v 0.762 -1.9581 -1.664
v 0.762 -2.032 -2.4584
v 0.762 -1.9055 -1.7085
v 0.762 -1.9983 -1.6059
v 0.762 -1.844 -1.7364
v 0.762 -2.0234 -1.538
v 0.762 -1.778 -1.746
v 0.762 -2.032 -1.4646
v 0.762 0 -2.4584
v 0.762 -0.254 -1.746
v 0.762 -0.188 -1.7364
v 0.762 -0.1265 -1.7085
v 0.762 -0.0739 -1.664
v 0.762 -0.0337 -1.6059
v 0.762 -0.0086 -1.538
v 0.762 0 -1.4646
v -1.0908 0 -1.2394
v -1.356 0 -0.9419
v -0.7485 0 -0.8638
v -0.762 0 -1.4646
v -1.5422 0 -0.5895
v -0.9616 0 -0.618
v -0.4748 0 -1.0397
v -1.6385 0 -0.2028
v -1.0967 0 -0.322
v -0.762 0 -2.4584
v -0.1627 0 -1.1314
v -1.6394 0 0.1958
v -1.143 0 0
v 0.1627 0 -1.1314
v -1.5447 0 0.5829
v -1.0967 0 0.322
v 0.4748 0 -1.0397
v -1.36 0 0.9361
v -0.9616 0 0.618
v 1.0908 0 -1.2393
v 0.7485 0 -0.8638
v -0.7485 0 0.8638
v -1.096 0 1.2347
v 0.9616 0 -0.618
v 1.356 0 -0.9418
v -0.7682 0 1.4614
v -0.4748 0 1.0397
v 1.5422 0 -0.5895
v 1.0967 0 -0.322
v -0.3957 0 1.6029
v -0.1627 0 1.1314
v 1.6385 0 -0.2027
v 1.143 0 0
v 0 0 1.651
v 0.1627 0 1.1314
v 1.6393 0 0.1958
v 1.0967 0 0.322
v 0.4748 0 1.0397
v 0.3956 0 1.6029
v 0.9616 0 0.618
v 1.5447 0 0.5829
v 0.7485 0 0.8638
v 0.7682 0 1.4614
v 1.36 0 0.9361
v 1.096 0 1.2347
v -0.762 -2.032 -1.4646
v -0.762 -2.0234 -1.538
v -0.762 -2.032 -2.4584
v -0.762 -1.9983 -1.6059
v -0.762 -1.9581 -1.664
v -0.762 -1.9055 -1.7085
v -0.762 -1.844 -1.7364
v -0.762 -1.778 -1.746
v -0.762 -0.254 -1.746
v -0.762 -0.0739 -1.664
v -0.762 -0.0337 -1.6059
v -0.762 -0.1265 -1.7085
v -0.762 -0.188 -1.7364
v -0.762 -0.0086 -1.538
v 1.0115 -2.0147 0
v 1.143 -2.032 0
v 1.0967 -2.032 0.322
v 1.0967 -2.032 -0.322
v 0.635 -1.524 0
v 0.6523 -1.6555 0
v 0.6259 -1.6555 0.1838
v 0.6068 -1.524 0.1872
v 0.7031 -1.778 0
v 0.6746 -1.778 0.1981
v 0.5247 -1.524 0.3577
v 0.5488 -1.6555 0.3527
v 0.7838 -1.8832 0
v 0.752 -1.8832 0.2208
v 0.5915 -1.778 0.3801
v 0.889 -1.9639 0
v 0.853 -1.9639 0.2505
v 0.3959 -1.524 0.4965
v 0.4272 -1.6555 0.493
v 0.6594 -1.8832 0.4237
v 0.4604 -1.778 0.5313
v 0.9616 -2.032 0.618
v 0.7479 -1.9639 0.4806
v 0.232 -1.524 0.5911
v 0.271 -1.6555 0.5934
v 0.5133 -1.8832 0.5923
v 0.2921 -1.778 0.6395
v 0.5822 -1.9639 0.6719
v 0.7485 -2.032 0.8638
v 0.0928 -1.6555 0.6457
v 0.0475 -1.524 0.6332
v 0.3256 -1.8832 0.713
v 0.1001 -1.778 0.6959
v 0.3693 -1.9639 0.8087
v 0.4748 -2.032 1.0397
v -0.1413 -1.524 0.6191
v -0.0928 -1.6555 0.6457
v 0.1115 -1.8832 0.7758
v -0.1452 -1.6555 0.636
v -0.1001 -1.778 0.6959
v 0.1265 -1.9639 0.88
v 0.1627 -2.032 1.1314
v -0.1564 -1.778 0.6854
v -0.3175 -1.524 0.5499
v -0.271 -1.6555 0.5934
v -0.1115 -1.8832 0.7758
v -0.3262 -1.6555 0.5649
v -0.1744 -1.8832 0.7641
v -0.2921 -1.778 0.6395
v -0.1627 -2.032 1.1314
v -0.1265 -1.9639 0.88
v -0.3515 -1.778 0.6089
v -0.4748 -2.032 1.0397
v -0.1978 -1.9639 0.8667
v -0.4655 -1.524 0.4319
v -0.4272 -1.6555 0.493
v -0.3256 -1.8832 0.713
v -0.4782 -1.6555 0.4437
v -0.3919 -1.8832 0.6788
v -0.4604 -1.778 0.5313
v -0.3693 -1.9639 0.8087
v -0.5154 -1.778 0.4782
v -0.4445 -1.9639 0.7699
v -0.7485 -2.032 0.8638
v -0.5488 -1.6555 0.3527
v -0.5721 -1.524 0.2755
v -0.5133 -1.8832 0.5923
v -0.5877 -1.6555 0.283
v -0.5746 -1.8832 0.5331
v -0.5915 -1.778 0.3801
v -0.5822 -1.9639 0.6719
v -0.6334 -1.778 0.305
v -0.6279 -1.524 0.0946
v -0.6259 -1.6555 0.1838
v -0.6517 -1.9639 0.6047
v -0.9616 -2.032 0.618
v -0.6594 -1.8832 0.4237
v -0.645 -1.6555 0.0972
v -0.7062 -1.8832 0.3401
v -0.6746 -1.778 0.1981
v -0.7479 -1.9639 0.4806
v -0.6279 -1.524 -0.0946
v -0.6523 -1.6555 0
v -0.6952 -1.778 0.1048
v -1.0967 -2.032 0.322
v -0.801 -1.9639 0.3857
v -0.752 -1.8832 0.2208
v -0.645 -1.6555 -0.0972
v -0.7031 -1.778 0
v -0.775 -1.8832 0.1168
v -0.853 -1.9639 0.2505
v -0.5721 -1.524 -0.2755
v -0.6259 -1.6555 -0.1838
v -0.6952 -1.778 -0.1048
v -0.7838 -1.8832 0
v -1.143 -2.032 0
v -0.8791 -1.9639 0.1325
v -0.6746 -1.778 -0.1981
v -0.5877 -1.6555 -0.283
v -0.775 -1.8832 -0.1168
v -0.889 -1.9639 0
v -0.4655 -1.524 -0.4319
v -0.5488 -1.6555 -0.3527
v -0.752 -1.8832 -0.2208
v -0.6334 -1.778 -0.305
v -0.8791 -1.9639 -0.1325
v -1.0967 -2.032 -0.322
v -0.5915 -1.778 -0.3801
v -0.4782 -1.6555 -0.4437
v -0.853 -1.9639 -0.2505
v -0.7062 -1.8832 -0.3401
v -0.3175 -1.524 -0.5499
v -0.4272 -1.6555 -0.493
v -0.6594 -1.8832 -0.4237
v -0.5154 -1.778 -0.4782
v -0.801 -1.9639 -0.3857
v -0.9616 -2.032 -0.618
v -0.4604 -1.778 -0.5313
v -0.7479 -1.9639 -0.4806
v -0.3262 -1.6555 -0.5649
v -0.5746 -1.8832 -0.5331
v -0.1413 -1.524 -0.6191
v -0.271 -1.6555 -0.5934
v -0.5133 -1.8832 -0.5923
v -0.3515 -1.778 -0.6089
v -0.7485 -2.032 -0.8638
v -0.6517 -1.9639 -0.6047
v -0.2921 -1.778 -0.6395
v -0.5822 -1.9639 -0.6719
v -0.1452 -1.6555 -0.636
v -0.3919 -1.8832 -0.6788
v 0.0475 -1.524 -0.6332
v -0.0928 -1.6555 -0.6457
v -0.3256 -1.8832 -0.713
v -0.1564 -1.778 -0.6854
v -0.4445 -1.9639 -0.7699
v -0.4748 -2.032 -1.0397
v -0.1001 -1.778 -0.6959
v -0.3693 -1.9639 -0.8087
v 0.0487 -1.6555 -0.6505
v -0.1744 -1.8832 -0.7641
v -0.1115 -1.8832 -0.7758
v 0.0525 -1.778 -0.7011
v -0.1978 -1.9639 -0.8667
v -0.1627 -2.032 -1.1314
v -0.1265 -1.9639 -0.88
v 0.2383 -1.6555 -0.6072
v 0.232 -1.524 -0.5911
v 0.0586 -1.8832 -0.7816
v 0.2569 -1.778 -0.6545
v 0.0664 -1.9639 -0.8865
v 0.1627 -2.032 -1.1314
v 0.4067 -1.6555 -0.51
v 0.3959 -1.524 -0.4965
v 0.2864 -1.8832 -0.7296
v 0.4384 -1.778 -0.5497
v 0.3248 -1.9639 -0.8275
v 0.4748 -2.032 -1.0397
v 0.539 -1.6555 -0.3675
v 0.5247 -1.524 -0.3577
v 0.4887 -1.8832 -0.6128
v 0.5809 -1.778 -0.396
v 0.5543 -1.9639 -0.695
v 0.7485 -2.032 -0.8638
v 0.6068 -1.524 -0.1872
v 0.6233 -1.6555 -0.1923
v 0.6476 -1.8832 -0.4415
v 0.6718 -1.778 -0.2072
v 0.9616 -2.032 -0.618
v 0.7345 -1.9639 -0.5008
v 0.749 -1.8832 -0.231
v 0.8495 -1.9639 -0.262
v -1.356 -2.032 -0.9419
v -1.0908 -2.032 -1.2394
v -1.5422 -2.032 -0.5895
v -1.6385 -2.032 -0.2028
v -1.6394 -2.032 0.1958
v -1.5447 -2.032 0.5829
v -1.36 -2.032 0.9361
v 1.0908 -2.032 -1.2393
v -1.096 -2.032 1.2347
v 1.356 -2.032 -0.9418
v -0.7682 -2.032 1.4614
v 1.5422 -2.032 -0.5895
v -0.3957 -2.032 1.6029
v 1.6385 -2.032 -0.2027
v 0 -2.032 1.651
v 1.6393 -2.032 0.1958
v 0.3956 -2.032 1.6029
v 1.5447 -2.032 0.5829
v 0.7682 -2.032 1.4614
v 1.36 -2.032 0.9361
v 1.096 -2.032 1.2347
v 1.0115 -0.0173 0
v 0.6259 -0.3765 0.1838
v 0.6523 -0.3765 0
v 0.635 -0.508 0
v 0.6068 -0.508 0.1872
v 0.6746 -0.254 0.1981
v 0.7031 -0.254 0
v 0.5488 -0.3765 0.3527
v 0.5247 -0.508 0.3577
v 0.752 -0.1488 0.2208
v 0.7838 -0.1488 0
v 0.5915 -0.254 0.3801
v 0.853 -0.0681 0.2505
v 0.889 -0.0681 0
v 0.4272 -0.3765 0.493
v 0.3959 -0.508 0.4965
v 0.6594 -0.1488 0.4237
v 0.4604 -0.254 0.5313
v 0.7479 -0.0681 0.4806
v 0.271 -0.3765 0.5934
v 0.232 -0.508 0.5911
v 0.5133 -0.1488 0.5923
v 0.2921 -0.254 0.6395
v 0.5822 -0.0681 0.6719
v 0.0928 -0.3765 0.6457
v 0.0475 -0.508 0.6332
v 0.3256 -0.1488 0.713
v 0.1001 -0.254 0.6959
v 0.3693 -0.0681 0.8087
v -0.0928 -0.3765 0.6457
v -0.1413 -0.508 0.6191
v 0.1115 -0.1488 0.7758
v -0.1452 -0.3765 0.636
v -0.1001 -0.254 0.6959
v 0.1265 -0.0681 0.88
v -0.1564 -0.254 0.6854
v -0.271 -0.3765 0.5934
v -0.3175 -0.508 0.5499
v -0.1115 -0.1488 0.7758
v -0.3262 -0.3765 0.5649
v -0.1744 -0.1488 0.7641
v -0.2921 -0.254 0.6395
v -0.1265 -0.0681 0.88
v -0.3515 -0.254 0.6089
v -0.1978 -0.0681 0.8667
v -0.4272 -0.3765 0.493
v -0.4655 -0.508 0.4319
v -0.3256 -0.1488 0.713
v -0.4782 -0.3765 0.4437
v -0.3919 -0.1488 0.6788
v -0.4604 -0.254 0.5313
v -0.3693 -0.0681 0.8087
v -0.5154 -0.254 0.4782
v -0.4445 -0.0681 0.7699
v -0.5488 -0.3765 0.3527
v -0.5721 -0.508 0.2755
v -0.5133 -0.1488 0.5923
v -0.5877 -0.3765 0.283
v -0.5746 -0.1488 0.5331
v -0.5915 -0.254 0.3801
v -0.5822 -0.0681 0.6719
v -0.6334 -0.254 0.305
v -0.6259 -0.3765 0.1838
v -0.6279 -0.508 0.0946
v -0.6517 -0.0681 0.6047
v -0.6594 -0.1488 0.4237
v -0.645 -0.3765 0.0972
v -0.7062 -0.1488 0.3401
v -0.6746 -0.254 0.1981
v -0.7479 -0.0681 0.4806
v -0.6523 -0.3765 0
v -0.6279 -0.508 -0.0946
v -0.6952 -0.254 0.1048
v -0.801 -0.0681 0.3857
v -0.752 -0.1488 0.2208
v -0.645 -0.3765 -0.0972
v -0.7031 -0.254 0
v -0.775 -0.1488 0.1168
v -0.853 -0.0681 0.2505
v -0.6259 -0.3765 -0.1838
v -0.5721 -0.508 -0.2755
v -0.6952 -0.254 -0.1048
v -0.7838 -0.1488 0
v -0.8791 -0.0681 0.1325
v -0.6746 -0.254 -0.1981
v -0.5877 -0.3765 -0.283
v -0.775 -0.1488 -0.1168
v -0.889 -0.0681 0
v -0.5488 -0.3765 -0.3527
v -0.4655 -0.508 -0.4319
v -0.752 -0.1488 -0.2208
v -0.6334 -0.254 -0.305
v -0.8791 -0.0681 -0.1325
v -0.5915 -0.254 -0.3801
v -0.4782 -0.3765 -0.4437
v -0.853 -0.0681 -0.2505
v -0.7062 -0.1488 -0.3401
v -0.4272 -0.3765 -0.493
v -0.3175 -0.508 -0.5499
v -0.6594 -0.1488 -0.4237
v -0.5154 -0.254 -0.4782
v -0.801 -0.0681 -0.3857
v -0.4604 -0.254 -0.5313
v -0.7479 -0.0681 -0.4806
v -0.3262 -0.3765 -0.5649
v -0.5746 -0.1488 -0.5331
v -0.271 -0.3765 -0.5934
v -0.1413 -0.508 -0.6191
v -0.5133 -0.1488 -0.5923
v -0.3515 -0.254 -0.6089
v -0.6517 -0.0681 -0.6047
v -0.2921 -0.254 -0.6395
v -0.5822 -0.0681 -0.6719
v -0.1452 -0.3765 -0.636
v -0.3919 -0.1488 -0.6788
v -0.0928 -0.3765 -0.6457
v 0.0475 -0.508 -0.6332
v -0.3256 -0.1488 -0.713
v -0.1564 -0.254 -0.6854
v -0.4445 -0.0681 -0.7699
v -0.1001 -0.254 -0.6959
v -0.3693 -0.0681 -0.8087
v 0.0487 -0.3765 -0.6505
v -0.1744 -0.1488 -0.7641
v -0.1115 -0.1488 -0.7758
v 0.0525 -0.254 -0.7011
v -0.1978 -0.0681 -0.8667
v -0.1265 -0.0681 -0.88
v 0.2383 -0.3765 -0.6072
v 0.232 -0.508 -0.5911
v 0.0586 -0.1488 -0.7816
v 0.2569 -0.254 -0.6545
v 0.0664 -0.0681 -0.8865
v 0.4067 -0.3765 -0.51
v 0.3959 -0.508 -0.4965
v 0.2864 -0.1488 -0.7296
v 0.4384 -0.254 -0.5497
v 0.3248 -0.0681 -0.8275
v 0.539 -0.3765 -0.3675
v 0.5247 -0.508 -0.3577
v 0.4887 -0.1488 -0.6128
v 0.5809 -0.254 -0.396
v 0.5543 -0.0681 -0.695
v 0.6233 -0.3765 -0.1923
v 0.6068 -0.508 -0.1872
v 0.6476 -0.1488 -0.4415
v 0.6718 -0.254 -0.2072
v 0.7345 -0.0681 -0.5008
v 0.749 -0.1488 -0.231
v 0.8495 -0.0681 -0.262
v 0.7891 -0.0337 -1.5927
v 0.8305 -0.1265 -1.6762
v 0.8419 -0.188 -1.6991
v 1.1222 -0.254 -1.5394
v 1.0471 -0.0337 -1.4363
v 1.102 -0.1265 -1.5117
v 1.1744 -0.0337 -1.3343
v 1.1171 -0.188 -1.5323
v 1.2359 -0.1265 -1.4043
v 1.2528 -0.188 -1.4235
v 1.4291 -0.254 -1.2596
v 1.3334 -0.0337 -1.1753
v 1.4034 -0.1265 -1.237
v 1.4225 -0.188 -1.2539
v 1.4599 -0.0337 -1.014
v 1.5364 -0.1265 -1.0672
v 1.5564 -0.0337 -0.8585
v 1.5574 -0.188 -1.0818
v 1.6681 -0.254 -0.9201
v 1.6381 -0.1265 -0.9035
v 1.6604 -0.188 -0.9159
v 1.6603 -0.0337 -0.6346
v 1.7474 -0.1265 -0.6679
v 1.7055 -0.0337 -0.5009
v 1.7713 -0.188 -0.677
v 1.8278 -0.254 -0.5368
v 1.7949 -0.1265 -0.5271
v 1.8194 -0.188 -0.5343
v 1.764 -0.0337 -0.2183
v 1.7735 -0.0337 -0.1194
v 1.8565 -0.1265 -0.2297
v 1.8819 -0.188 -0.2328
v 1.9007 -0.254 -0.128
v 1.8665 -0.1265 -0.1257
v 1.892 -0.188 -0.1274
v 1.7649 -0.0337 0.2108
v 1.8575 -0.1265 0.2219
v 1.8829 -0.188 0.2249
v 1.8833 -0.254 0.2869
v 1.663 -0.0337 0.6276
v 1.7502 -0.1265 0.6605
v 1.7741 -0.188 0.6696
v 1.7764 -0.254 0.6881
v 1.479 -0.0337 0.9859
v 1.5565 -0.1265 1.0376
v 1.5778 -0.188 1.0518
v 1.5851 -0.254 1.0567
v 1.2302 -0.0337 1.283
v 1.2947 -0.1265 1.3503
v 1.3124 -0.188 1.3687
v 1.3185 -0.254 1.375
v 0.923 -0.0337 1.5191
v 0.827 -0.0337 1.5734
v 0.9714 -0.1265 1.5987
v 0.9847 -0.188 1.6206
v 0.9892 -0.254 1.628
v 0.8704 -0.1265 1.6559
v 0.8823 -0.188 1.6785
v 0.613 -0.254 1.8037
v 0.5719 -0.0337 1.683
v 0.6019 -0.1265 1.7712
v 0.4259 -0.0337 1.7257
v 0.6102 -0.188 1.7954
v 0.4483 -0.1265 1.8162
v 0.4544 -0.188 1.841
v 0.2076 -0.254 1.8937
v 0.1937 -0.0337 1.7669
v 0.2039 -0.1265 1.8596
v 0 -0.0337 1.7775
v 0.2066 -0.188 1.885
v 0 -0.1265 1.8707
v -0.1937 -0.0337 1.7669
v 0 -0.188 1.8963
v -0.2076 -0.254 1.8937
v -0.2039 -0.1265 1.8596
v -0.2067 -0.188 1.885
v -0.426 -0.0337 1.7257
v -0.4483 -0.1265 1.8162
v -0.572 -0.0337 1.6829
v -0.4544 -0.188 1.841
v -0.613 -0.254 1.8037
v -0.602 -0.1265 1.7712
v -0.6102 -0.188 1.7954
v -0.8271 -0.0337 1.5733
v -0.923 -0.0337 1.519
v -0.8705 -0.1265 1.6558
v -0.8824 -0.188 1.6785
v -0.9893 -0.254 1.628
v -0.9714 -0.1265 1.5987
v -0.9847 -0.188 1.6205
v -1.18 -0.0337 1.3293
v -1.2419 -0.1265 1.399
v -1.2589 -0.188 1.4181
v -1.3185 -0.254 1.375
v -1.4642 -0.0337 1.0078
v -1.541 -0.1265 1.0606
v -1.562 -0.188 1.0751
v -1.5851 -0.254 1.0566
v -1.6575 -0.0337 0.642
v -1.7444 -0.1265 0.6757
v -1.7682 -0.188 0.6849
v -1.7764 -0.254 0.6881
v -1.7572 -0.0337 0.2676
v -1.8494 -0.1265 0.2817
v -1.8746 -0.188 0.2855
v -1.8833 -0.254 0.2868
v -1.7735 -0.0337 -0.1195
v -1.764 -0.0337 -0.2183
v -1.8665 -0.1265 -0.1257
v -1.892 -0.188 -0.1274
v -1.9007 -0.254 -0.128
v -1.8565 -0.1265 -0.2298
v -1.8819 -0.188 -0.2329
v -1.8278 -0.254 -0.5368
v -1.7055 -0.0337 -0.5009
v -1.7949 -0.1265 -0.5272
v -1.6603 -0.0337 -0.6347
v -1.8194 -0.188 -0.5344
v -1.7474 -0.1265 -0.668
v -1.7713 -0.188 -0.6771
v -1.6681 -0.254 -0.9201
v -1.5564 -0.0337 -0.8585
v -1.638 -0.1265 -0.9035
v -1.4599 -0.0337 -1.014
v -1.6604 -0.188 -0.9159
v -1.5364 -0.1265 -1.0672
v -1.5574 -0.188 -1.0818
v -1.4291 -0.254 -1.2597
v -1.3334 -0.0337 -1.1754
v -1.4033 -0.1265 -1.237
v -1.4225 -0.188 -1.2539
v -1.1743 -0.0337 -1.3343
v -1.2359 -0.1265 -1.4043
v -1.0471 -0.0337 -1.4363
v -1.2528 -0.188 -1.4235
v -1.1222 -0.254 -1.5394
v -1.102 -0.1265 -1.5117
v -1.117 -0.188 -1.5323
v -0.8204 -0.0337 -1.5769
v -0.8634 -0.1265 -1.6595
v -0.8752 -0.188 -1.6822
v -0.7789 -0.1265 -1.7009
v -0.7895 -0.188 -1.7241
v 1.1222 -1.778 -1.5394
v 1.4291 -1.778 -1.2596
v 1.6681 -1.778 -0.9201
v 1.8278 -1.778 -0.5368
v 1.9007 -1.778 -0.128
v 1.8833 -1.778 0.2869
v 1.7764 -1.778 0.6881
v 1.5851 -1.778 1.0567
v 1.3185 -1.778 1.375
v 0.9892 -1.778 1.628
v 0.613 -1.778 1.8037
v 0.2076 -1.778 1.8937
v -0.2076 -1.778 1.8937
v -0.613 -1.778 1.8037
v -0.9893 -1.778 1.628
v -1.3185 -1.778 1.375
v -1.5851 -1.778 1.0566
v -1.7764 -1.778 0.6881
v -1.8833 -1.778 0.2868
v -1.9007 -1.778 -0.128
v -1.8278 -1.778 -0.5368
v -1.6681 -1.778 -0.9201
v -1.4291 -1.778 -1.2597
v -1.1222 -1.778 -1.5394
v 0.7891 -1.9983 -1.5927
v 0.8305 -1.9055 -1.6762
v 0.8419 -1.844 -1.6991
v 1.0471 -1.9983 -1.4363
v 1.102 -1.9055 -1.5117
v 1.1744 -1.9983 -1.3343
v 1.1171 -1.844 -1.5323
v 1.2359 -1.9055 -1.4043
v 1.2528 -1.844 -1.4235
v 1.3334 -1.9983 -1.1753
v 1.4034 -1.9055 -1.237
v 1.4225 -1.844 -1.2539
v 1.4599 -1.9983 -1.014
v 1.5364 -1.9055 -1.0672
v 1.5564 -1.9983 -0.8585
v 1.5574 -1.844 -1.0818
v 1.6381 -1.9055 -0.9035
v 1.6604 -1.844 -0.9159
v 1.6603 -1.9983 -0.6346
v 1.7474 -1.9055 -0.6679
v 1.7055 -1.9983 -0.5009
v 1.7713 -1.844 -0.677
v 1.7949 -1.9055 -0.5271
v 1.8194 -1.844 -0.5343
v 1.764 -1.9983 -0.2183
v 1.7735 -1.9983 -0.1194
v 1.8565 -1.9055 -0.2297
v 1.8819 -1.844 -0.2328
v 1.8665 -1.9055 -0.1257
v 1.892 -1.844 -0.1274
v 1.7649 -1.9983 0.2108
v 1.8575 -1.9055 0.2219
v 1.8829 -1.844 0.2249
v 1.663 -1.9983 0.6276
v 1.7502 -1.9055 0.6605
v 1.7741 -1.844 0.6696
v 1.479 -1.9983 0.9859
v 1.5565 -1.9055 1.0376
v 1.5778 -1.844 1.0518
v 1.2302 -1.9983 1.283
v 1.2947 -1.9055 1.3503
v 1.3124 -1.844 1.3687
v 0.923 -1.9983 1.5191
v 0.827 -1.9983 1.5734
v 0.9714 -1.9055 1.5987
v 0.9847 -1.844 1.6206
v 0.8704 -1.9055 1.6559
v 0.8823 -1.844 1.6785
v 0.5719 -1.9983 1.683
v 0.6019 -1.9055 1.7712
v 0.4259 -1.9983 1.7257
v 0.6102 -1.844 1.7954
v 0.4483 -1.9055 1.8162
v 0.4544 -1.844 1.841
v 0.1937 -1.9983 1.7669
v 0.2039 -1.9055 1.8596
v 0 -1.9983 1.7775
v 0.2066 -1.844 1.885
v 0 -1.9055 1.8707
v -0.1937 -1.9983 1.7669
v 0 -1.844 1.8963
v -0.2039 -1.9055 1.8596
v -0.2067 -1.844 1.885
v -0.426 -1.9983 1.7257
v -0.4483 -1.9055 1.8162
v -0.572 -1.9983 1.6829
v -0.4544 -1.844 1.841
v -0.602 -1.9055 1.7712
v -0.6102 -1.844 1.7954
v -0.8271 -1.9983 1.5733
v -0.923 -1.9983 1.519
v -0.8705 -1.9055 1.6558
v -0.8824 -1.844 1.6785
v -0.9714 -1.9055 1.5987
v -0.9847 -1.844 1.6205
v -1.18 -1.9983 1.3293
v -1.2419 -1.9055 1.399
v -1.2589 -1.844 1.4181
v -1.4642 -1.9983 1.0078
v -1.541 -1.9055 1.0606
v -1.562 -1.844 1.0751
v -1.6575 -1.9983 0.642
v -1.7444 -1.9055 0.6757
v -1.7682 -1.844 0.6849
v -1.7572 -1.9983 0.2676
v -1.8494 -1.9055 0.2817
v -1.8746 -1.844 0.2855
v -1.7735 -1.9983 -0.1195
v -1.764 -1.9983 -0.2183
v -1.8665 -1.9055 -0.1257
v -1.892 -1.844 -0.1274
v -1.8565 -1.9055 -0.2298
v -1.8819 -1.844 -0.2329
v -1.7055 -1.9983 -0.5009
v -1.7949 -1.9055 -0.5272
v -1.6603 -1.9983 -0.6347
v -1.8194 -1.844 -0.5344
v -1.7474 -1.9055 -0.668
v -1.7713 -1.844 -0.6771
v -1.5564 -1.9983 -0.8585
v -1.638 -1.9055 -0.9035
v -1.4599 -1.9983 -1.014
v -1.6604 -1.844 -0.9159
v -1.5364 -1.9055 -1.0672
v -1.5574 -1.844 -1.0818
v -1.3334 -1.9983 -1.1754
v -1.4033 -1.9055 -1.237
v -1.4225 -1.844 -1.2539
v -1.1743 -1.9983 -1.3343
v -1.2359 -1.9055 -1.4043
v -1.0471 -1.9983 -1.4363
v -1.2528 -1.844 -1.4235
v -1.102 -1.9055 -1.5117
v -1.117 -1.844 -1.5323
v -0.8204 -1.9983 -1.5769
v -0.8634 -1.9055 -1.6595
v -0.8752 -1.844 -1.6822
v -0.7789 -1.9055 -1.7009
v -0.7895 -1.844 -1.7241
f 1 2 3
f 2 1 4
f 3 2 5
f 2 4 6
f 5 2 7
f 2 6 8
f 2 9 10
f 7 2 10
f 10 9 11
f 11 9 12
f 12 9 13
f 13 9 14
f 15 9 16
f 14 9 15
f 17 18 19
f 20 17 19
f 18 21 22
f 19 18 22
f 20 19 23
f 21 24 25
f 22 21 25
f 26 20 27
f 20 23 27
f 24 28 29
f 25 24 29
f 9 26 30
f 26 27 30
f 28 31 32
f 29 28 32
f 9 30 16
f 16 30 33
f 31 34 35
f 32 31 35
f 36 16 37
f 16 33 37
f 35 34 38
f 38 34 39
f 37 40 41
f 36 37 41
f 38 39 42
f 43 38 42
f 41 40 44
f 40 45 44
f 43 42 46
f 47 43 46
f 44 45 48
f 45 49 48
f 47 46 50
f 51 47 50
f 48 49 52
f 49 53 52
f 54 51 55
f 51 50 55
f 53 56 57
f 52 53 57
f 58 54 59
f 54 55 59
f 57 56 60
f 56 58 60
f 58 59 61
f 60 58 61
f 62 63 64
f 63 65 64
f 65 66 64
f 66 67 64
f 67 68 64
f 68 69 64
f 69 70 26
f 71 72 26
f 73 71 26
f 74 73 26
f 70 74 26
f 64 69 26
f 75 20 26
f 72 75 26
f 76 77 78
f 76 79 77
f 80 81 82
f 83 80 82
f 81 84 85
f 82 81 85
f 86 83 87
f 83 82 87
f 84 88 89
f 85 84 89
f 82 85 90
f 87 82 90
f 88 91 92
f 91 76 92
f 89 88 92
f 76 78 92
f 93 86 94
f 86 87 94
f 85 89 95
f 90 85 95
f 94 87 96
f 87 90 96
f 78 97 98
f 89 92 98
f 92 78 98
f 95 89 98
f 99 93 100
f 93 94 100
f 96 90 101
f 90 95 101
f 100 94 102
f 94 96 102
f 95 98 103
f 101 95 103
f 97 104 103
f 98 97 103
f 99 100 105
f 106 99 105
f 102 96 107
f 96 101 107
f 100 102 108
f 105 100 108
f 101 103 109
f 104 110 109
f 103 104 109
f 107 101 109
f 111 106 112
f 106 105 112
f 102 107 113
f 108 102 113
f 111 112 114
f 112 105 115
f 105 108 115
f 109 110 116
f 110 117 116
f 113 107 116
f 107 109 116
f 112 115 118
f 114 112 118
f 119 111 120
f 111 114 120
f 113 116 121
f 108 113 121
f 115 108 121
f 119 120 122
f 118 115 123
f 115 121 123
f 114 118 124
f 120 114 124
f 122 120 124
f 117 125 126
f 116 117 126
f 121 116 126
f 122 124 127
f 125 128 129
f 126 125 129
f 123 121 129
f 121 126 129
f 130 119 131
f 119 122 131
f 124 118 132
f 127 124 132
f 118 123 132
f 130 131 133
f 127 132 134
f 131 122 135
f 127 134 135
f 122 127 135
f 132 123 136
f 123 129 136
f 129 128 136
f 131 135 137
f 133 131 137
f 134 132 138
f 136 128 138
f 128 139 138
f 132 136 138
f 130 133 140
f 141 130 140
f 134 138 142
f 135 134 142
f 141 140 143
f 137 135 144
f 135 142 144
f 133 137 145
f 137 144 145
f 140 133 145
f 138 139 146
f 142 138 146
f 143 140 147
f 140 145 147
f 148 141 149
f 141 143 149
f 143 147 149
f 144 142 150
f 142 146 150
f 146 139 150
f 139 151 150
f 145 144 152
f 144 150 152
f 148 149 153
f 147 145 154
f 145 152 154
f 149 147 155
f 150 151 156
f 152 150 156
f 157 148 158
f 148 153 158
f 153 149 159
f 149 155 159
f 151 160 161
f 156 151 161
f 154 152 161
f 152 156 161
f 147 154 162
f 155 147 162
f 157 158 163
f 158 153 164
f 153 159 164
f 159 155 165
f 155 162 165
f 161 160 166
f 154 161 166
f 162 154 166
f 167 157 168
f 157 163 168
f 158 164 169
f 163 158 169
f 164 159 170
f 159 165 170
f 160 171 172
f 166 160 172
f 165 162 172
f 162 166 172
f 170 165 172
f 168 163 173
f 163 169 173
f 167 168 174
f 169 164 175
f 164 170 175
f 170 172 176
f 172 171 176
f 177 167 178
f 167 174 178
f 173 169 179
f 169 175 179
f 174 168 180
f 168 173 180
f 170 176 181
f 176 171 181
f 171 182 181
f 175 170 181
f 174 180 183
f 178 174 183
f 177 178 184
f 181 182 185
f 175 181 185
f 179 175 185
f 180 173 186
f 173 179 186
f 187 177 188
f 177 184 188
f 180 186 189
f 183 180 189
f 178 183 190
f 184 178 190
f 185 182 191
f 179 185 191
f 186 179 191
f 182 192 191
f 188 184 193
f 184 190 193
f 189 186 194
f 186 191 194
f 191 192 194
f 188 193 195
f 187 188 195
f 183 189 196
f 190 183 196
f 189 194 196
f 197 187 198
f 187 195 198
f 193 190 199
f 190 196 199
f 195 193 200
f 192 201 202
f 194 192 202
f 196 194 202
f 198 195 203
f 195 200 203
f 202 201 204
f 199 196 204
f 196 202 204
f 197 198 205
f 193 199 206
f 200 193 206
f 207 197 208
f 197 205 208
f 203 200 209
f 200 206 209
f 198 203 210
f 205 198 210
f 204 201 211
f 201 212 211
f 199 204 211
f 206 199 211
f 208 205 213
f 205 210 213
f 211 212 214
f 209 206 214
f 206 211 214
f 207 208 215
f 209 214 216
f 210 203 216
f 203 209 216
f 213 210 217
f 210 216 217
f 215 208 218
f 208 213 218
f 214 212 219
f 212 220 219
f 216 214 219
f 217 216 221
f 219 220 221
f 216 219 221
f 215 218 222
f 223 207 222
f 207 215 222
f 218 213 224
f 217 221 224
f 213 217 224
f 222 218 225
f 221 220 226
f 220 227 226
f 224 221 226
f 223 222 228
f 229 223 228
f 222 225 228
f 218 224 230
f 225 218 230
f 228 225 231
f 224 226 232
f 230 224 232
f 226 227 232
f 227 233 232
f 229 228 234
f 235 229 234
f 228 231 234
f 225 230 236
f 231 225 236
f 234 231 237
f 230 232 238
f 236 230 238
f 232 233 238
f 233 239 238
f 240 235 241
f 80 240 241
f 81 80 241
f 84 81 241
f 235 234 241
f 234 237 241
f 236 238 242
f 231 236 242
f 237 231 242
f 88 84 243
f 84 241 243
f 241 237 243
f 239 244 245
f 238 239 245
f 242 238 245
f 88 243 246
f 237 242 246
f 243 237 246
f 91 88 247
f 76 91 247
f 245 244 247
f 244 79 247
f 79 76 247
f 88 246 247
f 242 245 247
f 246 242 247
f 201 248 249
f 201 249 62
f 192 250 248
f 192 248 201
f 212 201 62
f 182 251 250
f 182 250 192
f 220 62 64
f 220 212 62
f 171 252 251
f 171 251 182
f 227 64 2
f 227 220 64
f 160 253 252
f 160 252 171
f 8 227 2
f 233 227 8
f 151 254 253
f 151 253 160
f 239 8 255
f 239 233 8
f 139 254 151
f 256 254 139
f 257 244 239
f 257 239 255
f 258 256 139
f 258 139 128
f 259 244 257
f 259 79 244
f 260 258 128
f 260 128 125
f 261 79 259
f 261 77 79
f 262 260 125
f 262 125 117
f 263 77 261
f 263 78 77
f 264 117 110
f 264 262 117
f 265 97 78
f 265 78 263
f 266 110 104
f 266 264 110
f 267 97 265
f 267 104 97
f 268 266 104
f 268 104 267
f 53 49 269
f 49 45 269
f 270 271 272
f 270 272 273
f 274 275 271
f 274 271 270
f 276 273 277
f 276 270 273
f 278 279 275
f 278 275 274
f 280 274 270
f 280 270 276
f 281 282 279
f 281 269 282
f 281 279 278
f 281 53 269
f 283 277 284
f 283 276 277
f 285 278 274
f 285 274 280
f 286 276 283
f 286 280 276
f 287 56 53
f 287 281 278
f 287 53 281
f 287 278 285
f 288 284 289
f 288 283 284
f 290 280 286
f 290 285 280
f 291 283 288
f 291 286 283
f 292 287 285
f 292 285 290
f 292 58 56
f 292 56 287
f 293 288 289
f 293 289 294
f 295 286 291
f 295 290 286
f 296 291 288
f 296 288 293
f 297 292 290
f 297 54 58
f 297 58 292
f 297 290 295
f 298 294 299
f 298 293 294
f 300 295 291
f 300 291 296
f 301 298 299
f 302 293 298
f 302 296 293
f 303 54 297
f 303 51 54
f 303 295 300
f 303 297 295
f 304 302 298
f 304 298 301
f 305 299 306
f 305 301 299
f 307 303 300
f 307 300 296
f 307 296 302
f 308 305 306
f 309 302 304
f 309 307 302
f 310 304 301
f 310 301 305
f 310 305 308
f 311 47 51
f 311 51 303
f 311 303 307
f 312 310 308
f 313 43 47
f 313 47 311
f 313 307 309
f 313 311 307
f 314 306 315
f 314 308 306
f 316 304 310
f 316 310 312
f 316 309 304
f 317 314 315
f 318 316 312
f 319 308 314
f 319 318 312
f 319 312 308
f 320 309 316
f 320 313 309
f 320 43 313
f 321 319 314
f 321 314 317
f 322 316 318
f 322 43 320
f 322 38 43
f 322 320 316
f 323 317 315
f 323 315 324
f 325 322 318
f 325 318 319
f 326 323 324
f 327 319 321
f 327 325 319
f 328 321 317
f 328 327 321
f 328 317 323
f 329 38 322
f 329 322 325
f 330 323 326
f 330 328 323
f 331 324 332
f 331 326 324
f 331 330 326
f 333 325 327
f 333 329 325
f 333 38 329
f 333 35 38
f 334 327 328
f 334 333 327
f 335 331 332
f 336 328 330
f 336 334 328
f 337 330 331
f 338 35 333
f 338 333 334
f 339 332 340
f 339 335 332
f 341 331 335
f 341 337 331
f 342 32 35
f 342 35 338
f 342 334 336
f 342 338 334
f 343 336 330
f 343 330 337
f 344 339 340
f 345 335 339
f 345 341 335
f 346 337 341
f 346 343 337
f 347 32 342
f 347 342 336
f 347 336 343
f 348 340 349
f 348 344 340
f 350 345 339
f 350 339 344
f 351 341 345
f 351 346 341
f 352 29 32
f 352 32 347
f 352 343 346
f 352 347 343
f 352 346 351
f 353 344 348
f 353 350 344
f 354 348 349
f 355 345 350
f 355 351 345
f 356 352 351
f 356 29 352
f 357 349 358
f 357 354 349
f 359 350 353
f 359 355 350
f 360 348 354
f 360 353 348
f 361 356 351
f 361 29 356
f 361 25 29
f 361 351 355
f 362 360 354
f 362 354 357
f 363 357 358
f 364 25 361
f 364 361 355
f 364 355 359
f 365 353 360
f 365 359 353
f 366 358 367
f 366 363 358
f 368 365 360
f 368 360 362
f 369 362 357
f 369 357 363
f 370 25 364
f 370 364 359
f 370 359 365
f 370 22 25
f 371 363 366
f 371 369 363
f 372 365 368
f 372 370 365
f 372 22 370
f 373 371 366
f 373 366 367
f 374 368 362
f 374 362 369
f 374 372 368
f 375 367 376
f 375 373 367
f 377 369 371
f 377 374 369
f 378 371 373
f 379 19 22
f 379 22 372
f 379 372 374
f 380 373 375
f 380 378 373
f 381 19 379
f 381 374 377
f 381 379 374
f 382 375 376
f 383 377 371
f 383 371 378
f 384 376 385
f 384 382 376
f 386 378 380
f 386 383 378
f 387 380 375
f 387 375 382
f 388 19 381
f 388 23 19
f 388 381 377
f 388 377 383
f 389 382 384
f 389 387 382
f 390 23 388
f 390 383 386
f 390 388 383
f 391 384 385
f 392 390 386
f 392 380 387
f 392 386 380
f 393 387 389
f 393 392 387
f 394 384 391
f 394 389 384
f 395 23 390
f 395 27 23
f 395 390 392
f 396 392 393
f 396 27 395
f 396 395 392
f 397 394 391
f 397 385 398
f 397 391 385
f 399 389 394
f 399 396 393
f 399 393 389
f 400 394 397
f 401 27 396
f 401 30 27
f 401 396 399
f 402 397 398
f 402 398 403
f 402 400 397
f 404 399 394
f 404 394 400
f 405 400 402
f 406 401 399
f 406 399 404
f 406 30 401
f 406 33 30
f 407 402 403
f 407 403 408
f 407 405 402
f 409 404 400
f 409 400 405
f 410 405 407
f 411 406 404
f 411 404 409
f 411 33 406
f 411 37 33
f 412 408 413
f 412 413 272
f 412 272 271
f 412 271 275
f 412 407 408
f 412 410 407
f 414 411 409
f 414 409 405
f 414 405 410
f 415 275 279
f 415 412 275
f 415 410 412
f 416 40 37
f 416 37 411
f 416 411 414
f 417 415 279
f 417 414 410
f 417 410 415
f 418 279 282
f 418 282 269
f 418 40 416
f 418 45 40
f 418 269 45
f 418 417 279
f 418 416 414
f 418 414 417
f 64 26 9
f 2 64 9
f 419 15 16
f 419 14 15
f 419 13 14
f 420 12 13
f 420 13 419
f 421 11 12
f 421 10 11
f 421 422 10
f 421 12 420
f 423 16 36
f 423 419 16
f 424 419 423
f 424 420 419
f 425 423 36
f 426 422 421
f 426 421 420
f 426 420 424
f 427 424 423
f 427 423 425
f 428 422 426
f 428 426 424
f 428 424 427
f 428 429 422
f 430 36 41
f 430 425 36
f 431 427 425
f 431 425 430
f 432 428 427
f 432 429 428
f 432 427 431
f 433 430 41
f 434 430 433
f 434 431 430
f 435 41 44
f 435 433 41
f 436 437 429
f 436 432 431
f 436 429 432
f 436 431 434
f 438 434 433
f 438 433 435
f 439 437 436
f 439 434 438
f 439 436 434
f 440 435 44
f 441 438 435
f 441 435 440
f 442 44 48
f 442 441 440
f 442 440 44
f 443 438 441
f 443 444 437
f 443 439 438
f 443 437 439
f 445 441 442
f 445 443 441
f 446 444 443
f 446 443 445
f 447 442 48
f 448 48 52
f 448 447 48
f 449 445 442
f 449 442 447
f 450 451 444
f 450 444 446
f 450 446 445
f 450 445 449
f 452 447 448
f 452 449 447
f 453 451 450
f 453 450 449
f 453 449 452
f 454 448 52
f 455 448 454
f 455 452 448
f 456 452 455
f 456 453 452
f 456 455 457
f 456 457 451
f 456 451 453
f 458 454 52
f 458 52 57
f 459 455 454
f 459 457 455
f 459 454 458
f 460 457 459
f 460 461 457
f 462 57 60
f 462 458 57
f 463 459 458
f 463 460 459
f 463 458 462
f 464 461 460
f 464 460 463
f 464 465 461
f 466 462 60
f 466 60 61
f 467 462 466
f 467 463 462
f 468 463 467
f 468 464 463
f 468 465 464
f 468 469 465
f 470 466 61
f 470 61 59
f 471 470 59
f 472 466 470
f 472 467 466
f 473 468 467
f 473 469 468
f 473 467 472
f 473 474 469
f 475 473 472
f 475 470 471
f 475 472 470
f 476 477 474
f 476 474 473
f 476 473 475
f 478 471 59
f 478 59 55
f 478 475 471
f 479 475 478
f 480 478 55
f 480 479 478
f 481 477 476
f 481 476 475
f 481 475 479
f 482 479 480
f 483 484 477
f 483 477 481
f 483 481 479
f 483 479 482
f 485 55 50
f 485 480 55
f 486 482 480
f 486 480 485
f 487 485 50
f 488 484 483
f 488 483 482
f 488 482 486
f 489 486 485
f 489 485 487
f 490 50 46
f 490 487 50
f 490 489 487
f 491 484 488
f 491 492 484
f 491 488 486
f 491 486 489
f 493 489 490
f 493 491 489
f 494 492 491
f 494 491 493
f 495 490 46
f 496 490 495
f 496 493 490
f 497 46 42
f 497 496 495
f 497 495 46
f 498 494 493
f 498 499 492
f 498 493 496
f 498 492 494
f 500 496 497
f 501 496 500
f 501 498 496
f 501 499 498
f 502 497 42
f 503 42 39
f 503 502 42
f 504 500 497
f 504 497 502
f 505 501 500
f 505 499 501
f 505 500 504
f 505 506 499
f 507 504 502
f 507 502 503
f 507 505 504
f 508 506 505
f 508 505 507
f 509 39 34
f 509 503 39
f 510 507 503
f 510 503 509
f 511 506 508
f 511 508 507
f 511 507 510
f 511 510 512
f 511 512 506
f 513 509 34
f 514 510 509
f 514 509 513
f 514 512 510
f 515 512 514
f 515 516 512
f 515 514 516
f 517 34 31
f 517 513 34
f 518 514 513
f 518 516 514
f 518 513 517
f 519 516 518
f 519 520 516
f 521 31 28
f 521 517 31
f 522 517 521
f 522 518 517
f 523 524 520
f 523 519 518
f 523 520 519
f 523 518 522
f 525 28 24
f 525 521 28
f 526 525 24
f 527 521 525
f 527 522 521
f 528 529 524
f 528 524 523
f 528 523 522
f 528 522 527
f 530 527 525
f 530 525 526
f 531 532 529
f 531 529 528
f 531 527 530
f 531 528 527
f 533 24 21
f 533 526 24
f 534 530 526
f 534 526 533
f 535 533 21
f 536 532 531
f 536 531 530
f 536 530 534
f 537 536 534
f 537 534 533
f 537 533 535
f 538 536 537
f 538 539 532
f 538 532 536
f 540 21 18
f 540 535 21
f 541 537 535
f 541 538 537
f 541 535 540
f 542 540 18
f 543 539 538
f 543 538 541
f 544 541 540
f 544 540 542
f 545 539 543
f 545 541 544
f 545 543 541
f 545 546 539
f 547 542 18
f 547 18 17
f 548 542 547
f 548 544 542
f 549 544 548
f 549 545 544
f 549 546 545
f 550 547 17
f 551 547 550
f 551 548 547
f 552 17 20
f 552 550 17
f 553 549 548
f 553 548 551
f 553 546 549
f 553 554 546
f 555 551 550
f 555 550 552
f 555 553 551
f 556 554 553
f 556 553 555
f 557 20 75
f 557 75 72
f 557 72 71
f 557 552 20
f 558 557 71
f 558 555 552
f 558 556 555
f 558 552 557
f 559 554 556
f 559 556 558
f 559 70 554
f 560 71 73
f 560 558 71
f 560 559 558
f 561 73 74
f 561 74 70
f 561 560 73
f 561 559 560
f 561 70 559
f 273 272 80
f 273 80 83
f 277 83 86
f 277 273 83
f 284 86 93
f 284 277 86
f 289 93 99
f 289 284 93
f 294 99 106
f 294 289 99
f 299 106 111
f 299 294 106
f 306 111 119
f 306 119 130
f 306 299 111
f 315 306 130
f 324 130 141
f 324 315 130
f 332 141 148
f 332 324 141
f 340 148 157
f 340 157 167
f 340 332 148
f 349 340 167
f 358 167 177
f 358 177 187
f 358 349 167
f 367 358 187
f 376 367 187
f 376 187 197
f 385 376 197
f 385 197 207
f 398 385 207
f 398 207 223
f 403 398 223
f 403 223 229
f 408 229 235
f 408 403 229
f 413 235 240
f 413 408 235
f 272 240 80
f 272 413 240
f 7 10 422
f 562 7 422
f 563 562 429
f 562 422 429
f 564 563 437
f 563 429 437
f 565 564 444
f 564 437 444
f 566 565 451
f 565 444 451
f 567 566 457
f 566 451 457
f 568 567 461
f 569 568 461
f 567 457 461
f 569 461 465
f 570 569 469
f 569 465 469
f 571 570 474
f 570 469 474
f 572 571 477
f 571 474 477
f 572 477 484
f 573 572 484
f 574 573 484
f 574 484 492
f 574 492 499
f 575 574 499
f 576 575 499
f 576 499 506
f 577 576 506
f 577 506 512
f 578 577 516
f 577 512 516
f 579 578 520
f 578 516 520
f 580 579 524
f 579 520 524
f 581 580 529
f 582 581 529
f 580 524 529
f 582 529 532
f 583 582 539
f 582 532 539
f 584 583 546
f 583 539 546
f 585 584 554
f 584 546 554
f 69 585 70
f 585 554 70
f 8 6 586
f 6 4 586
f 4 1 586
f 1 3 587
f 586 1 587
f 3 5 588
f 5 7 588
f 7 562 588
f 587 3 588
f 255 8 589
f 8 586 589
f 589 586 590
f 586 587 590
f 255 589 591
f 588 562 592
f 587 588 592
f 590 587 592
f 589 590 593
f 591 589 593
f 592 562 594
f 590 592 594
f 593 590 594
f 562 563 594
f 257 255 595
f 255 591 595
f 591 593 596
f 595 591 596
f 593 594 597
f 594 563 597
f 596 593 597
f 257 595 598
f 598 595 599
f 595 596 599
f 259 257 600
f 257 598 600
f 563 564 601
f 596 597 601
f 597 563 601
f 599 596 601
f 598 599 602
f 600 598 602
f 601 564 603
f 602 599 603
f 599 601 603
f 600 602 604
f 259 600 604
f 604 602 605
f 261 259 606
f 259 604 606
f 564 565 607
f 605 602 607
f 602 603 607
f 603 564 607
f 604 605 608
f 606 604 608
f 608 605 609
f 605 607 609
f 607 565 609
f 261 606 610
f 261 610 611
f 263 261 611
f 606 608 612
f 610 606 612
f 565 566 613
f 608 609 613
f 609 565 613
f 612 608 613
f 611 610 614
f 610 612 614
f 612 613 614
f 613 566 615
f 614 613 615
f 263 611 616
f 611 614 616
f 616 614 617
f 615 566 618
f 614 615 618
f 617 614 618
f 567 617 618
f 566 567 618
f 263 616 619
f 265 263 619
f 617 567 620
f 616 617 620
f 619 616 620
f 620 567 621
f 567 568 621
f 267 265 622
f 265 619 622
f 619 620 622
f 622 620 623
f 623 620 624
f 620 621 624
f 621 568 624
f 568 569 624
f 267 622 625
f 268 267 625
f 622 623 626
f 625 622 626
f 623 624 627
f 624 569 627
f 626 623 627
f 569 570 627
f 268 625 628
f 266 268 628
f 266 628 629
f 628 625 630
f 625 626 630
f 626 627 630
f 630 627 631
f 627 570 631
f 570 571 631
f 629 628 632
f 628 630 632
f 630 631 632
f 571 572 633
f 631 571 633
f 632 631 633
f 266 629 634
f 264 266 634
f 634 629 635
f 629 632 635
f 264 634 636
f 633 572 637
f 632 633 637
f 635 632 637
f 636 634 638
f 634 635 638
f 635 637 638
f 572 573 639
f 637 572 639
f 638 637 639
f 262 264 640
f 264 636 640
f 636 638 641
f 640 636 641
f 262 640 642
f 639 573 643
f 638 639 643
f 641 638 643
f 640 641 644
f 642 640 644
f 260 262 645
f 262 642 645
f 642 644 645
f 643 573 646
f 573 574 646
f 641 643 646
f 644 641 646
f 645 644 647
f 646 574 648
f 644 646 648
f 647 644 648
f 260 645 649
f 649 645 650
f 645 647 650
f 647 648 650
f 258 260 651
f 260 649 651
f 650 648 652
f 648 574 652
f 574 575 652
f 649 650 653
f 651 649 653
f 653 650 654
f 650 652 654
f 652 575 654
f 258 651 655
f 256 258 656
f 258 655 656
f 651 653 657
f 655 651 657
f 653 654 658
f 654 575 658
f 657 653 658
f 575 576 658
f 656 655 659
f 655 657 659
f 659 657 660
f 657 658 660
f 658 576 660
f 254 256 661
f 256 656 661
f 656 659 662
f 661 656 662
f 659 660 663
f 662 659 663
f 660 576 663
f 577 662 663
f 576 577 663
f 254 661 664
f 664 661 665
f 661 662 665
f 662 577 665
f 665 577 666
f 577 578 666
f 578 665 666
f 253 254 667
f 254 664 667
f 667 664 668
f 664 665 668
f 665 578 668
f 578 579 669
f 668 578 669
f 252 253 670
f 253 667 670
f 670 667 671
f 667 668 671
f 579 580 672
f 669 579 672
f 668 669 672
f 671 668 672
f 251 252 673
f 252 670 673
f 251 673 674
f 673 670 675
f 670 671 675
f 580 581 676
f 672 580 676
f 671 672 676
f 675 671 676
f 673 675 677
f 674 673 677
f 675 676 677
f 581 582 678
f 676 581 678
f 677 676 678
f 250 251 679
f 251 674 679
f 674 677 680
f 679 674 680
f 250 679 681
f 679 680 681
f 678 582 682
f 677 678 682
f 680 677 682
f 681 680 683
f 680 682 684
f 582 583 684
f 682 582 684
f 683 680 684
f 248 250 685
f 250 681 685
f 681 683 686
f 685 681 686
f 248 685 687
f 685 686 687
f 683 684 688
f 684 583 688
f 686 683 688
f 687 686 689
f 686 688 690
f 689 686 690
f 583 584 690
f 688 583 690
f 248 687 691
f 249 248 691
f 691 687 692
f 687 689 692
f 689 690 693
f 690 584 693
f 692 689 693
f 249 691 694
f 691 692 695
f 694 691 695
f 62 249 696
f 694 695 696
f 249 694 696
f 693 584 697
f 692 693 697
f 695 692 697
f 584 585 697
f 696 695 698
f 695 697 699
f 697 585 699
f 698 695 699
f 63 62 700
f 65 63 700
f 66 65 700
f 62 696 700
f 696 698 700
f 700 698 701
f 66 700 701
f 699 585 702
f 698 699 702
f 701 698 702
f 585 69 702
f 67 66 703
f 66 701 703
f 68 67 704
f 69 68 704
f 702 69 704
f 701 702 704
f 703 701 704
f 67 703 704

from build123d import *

# Parameters (mm, degrees)
F2_R     = 0.635
F0_DEPTH = 2.032
F3_R     = 0.508
F1_R     = 0.254


with BuildPart() as f0:
    # F2 (on Front) → F0 (new body)
    with BuildSketch(Plane.XZ):
        with BuildLine():
            Line((0.762018, -2.458423), (0.762018, -1.745953))
            ThreePointArc((0.762018, -1.745953), (-2e-05, 1.905), (-0.761982, -1.745969))
            Line((-0.761982, -1.745969), (-0.761982, -2.458431))
            Line((-0.761982, -2.458431), (0.762018, -2.458423))
        make_face()
        Circle(F2_R, mode=Mode.SUBTRACT)
    extrude(amount=F0_DEPTH)

    # F3
    f3_edges = [f0.edges().sort_by_distance(p)[0] for p in [
        (-0.635, 0, 0),
        (-0.635, -2.032, 0),
    ]]
    fillet(f3_edges, radius=F3_R)

    # F1
    f1_edges = [f0.edges().sort_by_distance(p)[0] for p in [
        (-2e-05, -2.032, 1.905),
        (-2e-05, 0, 1.905),
    ]]
    fillet(f1_edges, radius=F1_R)


solid = f0.part
